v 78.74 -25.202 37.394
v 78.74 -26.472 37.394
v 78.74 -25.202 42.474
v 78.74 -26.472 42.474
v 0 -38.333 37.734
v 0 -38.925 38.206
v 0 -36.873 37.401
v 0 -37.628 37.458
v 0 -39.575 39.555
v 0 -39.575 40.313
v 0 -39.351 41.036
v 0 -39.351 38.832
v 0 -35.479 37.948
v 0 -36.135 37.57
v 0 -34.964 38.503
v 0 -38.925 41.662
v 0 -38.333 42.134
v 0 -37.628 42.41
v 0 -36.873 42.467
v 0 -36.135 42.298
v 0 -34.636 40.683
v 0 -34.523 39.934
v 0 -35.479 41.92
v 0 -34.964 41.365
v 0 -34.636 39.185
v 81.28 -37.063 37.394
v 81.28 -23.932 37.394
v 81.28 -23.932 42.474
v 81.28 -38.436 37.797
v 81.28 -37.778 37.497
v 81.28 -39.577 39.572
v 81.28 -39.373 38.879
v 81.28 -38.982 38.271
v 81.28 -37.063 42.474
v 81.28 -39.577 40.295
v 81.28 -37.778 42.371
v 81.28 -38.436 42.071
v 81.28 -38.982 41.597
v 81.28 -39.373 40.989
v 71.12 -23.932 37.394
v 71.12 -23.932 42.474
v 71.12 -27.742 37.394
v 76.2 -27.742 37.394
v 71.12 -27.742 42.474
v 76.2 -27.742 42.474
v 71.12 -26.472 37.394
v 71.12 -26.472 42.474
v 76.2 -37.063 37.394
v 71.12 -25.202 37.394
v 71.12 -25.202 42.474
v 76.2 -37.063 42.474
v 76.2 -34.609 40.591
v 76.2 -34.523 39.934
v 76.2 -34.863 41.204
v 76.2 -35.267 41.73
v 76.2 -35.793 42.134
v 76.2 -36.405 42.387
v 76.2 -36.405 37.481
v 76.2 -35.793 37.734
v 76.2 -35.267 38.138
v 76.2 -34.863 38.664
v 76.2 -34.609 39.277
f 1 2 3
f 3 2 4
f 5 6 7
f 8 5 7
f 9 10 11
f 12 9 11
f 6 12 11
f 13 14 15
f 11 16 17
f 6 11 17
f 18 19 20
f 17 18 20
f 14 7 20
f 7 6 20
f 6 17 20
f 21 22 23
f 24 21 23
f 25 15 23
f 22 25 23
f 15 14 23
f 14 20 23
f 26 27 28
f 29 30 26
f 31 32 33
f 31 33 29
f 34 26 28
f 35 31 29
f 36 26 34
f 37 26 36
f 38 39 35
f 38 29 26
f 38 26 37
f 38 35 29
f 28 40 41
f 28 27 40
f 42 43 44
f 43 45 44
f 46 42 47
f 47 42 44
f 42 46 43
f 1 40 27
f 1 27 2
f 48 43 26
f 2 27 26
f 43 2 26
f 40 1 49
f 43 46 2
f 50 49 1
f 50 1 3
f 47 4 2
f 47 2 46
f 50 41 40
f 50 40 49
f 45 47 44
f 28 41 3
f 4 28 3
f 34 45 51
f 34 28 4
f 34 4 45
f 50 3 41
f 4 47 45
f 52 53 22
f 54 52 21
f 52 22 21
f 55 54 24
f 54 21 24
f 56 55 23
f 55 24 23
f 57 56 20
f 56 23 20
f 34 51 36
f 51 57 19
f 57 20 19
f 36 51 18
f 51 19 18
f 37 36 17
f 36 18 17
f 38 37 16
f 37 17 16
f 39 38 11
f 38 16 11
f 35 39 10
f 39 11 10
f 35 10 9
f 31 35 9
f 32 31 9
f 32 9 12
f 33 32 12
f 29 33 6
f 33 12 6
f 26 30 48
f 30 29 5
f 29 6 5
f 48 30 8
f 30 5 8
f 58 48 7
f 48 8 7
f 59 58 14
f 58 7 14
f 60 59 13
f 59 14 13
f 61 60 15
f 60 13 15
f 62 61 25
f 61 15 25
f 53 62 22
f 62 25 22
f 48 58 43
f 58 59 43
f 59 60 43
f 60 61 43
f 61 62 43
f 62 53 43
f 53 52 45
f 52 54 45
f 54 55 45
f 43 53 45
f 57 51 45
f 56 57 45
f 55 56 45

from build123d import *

# Parameters (mm, degrees)
F0_R      = 2.54
F1_DEPTH  = 76.2
F3_DEPTH  = 5.08
F4_W      = 5.08
F4_H      = 5.08
F4_W_2    = 2.54
F5_DEPTH  = 1.27
F3_FACE_W = 2.54
F3_FACE_H = 5.08
F6_DEPTH  = 3.81
F7_W      = 1.27
F7_H      = 5.08
F8_DEPTH  = 7.62


with BuildPart() as f1:
    # F0 (on Right) → F1 (new body)
    with BuildSketch(Plane.YZ):
        with Locations((-37.062876, 39.933953)):
            Circle(F0_R)
    extrude(amount=F1_DEPTH)

    # F2 (on face) → F3 (join)
    with BuildSketch(Plane.YZ.offset(76.2)):
        with BuildLine():
            Line((-27.742092, 42.473953), (-37.062876, 42.473953))
            ThreePointArc((-37.062876, 42.473953), (-35.266825, 41.730005), (-34.522876, 39.933953))
            ThreePointArc((-34.522876, 39.933953), (-35.266825, 38.137902), (-37.062876, 37.393953))
            Line((-37.062876, 37.393953), (-27.742092, 37.393953))
            Line((-27.742092, 37.393953), (-27.742092, 42.473953))
        make_face()
        with BuildLine():
            Line((-37.062876, 42.473953), (-37.062876, 39.933953))
            Line((-37.062876, 39.933953), (-37.062876, 37.393953))
            ThreePointArc((-37.062876, 37.393953), (-35.266825, 38.137902), (-34.522876, 39.933953))
            ThreePointArc((-34.522876, 39.933953), (-35.266825, 41.730005), (-37.062876, 42.473953))
        make_face()
        with BuildLine():
            Line((-37.062876, 37.393953), (-37.062876, 39.933953))
            Line((-37.062876, 39.933953), (-37.062876, 42.473953))
            ThreePointArc((-37.062876, 42.473953), (-39.602876, 39.933953), (-37.062876, 37.393953))
        make_face()
    extrude(amount=F3_DEPTH)

    # F4 (on face) → F5 (join)
    with BuildSketch(Plane(origin=(0, -27.742092, 0), x_dir=(-1, 0, 0), z_dir=(0, 1, 0))):
        with Locations((-73.66, 39.933953)):
            Rectangle(F4_W, F4_H)
        with Locations((-77.47, 39.933953)):
            Rectangle(F4_W_2, F4_H)
    extrude(amount=F5_DEPTH)

    # F3_face (on face) → F6 (join)
    with BuildSketch(Plane(origin=(78.74, -27.742092, 39.933953), x_dir=(-1, 0, 0), z_dir=(0, 1, 0))):
        with Locations((-1.27, 0)):
            Rectangle(F3_FACE_W, F3_FACE_H)
    extrude(amount=F6_DEPTH)

    # F7 (on face) → F8 (join)
    with BuildSketch(Plane(origin=(78.74, 0, 0), x_dir=(0, -1, 0), z_dir=(-1, 0, 0))):
        with Locations((24.567092, 39.933953)):
            Rectangle(F7_W, F7_H)
    extrude(amount=F8_DEPTH)


solid = f1.part
